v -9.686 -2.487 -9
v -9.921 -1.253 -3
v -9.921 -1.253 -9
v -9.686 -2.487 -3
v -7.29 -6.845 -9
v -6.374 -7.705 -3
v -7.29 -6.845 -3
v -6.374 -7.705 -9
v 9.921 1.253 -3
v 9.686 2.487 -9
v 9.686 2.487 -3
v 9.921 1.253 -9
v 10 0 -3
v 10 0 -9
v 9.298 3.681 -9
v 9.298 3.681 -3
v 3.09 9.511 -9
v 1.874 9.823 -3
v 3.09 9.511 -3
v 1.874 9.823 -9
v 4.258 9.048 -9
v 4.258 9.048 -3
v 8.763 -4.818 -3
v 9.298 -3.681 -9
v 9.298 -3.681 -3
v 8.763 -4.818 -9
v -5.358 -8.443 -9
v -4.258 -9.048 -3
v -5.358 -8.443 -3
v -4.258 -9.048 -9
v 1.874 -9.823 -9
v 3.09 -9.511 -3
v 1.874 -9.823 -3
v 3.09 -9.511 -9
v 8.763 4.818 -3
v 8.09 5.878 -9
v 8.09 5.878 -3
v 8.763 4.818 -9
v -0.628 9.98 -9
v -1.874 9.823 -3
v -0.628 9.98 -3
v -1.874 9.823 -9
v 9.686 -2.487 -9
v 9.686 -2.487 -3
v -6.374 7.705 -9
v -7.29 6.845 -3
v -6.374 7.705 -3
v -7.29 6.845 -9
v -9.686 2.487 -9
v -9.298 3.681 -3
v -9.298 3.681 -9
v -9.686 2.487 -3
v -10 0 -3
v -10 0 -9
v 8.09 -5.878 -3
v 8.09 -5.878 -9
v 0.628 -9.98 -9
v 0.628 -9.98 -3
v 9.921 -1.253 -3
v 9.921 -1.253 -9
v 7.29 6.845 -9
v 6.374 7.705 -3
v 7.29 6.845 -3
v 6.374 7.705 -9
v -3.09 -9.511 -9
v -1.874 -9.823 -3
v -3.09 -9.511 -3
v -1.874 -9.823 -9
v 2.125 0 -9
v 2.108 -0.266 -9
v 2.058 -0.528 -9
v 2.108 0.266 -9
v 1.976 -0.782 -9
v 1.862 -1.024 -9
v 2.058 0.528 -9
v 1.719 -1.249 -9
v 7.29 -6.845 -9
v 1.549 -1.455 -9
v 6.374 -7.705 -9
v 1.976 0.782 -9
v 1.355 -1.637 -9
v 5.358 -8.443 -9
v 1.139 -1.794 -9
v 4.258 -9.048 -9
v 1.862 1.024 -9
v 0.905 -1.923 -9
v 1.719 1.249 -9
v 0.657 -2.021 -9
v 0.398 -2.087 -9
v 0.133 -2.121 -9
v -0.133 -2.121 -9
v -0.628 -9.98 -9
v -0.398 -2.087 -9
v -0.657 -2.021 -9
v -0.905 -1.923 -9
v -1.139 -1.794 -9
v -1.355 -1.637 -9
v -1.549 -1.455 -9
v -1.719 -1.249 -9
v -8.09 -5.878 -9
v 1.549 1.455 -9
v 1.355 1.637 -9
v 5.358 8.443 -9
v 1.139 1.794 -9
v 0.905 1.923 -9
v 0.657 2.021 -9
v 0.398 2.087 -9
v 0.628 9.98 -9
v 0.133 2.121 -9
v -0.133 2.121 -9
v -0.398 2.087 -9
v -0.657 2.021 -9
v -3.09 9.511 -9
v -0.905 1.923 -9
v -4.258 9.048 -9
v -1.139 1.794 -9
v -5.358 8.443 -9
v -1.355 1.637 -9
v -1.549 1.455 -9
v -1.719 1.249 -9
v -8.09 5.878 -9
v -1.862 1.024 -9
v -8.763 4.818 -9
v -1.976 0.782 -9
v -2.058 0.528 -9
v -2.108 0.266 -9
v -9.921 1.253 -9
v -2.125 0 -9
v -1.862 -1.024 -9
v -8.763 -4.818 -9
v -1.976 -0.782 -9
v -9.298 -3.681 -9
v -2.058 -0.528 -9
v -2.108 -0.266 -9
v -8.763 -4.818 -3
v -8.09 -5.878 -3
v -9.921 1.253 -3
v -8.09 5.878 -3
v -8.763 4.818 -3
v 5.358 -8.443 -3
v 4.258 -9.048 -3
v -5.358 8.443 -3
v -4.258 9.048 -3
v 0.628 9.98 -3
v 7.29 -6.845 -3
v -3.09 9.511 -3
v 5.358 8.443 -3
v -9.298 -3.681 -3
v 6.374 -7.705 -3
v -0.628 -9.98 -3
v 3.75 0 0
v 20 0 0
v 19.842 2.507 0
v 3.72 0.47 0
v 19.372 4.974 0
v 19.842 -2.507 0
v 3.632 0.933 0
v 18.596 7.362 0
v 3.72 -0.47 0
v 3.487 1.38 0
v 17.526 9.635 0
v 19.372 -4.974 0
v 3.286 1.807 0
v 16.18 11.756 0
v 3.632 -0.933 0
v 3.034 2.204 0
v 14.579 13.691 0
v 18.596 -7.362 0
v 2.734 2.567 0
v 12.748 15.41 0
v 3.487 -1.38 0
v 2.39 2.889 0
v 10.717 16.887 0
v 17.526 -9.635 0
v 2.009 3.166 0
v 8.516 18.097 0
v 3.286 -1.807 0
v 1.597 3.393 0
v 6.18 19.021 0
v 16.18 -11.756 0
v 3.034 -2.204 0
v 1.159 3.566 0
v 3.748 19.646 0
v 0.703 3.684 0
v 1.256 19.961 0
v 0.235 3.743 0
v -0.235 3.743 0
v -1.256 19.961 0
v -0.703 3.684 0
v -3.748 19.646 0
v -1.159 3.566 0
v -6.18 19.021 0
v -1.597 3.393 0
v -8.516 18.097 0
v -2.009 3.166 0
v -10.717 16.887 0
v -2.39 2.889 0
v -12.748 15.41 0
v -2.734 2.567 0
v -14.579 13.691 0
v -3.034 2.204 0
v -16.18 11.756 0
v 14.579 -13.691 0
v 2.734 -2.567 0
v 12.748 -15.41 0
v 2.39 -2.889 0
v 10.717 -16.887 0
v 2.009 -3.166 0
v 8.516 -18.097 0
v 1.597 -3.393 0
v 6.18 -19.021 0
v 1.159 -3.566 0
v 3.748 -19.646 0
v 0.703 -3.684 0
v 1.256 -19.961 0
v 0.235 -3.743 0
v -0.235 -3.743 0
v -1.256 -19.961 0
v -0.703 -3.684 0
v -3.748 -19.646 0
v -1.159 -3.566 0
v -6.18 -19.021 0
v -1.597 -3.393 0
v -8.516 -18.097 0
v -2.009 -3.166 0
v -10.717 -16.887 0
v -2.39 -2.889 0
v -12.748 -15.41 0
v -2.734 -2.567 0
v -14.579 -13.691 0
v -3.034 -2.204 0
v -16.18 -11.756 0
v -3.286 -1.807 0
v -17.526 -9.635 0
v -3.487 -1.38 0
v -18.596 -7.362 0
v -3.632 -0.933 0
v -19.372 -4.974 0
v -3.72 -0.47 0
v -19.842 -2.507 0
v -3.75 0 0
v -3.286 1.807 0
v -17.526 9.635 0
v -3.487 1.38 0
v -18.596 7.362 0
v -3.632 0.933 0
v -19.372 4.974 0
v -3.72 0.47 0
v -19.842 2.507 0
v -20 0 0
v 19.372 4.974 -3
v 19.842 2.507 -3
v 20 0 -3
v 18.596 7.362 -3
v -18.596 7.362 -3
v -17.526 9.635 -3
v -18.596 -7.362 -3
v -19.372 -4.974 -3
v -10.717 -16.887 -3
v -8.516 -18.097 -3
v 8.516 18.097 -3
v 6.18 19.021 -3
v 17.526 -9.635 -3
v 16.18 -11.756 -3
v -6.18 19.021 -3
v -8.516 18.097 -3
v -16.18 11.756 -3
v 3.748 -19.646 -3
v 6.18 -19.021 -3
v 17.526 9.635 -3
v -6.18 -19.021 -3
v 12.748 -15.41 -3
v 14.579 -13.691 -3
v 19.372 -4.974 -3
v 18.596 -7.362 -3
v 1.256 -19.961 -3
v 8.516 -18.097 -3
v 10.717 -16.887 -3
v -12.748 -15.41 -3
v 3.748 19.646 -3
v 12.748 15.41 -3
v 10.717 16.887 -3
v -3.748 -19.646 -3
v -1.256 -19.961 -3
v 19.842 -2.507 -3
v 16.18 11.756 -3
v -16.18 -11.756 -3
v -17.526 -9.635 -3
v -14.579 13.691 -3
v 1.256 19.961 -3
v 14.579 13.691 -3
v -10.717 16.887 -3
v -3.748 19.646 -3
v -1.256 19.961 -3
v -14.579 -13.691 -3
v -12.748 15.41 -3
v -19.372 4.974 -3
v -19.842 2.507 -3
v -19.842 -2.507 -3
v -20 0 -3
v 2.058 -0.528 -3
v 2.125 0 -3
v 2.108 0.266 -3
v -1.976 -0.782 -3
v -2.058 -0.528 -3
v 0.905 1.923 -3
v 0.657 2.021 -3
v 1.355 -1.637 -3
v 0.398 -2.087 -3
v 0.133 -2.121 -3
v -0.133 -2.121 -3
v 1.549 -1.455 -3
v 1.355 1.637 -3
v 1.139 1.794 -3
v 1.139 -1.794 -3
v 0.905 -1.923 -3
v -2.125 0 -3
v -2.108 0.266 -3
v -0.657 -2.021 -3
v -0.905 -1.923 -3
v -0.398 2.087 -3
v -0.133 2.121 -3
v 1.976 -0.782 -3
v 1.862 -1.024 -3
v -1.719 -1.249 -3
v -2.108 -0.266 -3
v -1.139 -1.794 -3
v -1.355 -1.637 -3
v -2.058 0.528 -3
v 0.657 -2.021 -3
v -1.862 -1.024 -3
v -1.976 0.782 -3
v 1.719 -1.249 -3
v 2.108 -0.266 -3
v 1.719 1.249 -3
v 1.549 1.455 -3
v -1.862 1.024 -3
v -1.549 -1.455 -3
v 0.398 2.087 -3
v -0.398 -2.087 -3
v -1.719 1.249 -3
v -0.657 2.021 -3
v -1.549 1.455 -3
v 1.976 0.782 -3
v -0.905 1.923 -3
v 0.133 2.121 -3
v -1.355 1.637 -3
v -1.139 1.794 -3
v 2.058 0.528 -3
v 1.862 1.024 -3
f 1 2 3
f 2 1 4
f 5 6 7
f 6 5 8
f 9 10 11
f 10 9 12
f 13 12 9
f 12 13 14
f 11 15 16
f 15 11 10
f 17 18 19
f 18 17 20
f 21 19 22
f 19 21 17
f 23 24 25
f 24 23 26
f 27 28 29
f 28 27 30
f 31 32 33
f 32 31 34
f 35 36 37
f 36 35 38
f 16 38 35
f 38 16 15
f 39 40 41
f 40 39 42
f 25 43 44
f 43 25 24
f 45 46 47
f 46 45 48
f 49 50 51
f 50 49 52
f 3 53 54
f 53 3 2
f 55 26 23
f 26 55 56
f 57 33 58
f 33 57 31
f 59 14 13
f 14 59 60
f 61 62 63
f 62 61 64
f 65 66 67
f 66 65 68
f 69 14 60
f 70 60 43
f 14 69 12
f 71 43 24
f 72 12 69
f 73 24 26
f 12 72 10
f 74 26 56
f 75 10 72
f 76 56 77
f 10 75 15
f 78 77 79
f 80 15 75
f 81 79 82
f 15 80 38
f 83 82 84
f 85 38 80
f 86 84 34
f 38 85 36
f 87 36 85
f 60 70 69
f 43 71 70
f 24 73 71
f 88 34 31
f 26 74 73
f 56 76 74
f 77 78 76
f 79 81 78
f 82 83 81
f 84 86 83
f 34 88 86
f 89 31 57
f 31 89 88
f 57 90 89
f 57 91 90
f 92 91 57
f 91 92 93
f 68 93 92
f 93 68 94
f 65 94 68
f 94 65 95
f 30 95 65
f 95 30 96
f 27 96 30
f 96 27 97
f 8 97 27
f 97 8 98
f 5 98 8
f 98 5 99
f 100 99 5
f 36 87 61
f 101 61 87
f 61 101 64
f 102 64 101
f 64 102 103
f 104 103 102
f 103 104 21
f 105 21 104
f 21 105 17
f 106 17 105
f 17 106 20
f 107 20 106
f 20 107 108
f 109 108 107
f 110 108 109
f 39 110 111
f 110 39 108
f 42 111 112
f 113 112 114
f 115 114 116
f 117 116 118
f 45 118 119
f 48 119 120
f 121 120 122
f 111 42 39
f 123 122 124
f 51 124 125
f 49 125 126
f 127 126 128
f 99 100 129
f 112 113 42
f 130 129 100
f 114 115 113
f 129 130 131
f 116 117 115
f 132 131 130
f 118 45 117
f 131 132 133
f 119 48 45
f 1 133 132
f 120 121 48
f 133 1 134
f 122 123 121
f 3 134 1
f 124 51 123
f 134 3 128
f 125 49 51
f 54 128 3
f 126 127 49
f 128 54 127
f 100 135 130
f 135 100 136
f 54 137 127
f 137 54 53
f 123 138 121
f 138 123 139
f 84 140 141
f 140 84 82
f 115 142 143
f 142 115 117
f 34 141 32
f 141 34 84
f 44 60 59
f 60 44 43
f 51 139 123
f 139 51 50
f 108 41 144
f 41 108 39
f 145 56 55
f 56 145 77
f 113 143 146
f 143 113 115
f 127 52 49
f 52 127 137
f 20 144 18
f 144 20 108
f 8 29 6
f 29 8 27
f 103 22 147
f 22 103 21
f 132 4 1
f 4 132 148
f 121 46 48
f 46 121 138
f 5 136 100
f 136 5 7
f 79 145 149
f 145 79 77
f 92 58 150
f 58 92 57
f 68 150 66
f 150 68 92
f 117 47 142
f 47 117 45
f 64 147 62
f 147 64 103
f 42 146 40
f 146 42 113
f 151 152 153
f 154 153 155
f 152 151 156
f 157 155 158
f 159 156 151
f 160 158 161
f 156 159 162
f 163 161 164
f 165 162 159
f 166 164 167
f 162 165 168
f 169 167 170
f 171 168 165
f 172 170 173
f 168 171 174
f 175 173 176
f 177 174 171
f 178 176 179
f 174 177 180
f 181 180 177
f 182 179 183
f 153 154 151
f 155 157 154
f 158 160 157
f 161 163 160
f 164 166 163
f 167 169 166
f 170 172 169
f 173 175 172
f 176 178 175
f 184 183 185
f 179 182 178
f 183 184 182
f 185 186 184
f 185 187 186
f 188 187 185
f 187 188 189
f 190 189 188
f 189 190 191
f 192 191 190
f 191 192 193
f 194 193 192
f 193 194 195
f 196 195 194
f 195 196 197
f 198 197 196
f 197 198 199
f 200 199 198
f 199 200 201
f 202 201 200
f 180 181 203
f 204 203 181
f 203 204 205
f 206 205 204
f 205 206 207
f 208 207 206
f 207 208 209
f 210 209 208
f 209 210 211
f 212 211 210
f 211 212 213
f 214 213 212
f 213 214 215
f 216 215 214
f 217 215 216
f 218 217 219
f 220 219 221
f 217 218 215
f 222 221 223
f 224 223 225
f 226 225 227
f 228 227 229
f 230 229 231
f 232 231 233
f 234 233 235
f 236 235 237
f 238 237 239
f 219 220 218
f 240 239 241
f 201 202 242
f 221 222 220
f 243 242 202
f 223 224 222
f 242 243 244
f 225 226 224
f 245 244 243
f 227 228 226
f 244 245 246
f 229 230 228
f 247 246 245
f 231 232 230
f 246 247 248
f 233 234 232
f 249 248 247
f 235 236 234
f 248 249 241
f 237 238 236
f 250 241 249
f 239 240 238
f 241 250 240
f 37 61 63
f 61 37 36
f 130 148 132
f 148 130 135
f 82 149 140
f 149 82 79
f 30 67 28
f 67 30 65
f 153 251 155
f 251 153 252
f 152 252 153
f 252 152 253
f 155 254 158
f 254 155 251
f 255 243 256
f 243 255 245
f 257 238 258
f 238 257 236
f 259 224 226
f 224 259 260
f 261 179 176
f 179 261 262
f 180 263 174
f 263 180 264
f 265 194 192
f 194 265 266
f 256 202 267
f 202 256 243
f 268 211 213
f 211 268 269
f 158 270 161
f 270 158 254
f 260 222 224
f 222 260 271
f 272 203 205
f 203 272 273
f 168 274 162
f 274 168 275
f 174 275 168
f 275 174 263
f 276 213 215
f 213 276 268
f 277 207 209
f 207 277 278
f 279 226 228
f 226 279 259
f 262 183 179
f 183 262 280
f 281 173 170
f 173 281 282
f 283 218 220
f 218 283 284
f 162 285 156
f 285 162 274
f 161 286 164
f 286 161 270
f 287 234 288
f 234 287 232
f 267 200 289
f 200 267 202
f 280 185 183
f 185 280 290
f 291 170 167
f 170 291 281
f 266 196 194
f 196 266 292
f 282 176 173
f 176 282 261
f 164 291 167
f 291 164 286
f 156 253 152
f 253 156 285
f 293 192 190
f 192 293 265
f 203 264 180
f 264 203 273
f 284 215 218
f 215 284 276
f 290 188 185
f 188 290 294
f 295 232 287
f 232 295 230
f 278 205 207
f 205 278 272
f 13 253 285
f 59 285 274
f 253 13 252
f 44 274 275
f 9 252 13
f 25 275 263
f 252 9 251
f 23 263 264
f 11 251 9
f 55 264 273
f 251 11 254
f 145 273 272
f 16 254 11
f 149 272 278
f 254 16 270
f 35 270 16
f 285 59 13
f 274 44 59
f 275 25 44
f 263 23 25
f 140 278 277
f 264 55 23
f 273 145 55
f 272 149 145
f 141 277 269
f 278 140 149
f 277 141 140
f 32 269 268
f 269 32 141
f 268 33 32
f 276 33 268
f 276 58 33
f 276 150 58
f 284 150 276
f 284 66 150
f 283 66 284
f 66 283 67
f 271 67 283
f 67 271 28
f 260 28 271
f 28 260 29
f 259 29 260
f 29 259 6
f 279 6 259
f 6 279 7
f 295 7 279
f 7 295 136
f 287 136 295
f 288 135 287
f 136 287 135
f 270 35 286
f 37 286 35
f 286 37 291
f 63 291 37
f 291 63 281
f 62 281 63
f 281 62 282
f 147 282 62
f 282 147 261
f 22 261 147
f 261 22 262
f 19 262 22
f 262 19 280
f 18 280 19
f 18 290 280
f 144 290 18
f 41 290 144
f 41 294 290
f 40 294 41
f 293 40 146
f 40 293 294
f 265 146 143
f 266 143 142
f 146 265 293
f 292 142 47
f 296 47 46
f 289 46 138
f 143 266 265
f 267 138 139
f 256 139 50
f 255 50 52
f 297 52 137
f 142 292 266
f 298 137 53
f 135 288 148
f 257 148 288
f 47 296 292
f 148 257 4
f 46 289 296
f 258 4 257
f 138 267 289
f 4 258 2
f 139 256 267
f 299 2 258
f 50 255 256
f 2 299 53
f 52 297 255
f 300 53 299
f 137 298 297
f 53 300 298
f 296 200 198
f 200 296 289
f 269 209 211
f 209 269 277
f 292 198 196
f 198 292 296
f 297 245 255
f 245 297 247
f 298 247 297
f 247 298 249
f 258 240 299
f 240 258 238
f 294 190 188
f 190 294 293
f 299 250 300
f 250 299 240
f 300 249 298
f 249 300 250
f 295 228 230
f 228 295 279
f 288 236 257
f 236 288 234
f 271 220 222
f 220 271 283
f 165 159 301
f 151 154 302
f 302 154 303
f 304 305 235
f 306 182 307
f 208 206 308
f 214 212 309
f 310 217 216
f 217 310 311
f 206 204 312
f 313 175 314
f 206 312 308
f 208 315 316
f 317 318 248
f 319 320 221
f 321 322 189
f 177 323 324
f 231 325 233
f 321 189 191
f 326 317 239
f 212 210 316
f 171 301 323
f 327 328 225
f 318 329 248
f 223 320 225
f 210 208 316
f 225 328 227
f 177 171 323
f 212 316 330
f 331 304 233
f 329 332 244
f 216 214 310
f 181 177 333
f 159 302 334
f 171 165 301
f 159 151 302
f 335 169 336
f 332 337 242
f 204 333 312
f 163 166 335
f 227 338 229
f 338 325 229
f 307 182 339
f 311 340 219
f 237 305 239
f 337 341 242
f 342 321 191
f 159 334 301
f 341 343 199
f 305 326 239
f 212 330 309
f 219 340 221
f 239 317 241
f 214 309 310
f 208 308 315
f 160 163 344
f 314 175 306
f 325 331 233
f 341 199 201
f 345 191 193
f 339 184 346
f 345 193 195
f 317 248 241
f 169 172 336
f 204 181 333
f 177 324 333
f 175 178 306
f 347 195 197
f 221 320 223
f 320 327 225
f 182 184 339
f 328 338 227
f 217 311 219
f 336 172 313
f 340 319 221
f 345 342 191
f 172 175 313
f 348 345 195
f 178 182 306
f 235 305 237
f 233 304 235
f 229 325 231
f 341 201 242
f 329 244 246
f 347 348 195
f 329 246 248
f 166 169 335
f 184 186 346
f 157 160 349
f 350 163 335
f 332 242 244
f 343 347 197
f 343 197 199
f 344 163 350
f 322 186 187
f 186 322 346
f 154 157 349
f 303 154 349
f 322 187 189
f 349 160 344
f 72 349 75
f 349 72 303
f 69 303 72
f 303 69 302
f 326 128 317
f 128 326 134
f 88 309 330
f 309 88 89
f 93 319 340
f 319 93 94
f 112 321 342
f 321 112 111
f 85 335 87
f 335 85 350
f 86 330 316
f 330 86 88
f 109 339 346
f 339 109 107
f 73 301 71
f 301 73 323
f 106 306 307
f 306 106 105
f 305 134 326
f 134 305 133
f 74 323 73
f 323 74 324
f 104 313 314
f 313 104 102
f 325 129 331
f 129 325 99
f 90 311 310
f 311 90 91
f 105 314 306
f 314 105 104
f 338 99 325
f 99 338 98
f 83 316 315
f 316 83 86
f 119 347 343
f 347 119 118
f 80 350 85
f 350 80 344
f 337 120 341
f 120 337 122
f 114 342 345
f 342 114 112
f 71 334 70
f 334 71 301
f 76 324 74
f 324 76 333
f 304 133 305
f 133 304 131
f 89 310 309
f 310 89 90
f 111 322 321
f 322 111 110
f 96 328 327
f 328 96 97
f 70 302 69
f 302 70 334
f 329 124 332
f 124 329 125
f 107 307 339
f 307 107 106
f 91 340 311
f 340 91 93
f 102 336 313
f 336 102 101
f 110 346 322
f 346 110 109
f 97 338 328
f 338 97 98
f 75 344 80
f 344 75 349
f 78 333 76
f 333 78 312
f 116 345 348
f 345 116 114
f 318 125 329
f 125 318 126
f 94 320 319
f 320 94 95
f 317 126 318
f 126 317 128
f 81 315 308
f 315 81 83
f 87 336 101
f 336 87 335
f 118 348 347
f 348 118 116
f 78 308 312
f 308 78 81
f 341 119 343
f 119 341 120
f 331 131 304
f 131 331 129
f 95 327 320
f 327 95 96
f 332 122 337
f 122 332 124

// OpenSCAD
$fn = 50;


difference() {
	union() {
		translate(v = [0, 0, -9.0000000000]) {
			cylinder(h = 9, r = 10.0000000000);
		}
		translate(v = [0, 0, -3.0000000000]) {
			cylinder(h = 3, r = 20.0000000000);
		}
	}
	union() {
		translate(v = [0, 0, 0]) {
			rotate(a = [0, 0, 0]) {
				difference() {
					union() {
						#translate(v = [0, 0, -9.0000000000]) {
							cylinder(h = 9, r = 2.0000000000);
						}
						#translate(v = [0, 0, -3]) {
							cylinder(h = 3, r = 10.0000000000, r1 = 2.1250000000, r2 = 3.7500000000);
						}
						#translate(v = [0, 0, -9.0000000000]) {
							cylinder(h = 9, r = 2.1250000000);
						}
						#translate(v = [0, 0, -9.0000000000]) {
							cylinder(h = 9, r = 2.0000000000);
						}
					}
					union();
				}
			}
		}
	}
}
